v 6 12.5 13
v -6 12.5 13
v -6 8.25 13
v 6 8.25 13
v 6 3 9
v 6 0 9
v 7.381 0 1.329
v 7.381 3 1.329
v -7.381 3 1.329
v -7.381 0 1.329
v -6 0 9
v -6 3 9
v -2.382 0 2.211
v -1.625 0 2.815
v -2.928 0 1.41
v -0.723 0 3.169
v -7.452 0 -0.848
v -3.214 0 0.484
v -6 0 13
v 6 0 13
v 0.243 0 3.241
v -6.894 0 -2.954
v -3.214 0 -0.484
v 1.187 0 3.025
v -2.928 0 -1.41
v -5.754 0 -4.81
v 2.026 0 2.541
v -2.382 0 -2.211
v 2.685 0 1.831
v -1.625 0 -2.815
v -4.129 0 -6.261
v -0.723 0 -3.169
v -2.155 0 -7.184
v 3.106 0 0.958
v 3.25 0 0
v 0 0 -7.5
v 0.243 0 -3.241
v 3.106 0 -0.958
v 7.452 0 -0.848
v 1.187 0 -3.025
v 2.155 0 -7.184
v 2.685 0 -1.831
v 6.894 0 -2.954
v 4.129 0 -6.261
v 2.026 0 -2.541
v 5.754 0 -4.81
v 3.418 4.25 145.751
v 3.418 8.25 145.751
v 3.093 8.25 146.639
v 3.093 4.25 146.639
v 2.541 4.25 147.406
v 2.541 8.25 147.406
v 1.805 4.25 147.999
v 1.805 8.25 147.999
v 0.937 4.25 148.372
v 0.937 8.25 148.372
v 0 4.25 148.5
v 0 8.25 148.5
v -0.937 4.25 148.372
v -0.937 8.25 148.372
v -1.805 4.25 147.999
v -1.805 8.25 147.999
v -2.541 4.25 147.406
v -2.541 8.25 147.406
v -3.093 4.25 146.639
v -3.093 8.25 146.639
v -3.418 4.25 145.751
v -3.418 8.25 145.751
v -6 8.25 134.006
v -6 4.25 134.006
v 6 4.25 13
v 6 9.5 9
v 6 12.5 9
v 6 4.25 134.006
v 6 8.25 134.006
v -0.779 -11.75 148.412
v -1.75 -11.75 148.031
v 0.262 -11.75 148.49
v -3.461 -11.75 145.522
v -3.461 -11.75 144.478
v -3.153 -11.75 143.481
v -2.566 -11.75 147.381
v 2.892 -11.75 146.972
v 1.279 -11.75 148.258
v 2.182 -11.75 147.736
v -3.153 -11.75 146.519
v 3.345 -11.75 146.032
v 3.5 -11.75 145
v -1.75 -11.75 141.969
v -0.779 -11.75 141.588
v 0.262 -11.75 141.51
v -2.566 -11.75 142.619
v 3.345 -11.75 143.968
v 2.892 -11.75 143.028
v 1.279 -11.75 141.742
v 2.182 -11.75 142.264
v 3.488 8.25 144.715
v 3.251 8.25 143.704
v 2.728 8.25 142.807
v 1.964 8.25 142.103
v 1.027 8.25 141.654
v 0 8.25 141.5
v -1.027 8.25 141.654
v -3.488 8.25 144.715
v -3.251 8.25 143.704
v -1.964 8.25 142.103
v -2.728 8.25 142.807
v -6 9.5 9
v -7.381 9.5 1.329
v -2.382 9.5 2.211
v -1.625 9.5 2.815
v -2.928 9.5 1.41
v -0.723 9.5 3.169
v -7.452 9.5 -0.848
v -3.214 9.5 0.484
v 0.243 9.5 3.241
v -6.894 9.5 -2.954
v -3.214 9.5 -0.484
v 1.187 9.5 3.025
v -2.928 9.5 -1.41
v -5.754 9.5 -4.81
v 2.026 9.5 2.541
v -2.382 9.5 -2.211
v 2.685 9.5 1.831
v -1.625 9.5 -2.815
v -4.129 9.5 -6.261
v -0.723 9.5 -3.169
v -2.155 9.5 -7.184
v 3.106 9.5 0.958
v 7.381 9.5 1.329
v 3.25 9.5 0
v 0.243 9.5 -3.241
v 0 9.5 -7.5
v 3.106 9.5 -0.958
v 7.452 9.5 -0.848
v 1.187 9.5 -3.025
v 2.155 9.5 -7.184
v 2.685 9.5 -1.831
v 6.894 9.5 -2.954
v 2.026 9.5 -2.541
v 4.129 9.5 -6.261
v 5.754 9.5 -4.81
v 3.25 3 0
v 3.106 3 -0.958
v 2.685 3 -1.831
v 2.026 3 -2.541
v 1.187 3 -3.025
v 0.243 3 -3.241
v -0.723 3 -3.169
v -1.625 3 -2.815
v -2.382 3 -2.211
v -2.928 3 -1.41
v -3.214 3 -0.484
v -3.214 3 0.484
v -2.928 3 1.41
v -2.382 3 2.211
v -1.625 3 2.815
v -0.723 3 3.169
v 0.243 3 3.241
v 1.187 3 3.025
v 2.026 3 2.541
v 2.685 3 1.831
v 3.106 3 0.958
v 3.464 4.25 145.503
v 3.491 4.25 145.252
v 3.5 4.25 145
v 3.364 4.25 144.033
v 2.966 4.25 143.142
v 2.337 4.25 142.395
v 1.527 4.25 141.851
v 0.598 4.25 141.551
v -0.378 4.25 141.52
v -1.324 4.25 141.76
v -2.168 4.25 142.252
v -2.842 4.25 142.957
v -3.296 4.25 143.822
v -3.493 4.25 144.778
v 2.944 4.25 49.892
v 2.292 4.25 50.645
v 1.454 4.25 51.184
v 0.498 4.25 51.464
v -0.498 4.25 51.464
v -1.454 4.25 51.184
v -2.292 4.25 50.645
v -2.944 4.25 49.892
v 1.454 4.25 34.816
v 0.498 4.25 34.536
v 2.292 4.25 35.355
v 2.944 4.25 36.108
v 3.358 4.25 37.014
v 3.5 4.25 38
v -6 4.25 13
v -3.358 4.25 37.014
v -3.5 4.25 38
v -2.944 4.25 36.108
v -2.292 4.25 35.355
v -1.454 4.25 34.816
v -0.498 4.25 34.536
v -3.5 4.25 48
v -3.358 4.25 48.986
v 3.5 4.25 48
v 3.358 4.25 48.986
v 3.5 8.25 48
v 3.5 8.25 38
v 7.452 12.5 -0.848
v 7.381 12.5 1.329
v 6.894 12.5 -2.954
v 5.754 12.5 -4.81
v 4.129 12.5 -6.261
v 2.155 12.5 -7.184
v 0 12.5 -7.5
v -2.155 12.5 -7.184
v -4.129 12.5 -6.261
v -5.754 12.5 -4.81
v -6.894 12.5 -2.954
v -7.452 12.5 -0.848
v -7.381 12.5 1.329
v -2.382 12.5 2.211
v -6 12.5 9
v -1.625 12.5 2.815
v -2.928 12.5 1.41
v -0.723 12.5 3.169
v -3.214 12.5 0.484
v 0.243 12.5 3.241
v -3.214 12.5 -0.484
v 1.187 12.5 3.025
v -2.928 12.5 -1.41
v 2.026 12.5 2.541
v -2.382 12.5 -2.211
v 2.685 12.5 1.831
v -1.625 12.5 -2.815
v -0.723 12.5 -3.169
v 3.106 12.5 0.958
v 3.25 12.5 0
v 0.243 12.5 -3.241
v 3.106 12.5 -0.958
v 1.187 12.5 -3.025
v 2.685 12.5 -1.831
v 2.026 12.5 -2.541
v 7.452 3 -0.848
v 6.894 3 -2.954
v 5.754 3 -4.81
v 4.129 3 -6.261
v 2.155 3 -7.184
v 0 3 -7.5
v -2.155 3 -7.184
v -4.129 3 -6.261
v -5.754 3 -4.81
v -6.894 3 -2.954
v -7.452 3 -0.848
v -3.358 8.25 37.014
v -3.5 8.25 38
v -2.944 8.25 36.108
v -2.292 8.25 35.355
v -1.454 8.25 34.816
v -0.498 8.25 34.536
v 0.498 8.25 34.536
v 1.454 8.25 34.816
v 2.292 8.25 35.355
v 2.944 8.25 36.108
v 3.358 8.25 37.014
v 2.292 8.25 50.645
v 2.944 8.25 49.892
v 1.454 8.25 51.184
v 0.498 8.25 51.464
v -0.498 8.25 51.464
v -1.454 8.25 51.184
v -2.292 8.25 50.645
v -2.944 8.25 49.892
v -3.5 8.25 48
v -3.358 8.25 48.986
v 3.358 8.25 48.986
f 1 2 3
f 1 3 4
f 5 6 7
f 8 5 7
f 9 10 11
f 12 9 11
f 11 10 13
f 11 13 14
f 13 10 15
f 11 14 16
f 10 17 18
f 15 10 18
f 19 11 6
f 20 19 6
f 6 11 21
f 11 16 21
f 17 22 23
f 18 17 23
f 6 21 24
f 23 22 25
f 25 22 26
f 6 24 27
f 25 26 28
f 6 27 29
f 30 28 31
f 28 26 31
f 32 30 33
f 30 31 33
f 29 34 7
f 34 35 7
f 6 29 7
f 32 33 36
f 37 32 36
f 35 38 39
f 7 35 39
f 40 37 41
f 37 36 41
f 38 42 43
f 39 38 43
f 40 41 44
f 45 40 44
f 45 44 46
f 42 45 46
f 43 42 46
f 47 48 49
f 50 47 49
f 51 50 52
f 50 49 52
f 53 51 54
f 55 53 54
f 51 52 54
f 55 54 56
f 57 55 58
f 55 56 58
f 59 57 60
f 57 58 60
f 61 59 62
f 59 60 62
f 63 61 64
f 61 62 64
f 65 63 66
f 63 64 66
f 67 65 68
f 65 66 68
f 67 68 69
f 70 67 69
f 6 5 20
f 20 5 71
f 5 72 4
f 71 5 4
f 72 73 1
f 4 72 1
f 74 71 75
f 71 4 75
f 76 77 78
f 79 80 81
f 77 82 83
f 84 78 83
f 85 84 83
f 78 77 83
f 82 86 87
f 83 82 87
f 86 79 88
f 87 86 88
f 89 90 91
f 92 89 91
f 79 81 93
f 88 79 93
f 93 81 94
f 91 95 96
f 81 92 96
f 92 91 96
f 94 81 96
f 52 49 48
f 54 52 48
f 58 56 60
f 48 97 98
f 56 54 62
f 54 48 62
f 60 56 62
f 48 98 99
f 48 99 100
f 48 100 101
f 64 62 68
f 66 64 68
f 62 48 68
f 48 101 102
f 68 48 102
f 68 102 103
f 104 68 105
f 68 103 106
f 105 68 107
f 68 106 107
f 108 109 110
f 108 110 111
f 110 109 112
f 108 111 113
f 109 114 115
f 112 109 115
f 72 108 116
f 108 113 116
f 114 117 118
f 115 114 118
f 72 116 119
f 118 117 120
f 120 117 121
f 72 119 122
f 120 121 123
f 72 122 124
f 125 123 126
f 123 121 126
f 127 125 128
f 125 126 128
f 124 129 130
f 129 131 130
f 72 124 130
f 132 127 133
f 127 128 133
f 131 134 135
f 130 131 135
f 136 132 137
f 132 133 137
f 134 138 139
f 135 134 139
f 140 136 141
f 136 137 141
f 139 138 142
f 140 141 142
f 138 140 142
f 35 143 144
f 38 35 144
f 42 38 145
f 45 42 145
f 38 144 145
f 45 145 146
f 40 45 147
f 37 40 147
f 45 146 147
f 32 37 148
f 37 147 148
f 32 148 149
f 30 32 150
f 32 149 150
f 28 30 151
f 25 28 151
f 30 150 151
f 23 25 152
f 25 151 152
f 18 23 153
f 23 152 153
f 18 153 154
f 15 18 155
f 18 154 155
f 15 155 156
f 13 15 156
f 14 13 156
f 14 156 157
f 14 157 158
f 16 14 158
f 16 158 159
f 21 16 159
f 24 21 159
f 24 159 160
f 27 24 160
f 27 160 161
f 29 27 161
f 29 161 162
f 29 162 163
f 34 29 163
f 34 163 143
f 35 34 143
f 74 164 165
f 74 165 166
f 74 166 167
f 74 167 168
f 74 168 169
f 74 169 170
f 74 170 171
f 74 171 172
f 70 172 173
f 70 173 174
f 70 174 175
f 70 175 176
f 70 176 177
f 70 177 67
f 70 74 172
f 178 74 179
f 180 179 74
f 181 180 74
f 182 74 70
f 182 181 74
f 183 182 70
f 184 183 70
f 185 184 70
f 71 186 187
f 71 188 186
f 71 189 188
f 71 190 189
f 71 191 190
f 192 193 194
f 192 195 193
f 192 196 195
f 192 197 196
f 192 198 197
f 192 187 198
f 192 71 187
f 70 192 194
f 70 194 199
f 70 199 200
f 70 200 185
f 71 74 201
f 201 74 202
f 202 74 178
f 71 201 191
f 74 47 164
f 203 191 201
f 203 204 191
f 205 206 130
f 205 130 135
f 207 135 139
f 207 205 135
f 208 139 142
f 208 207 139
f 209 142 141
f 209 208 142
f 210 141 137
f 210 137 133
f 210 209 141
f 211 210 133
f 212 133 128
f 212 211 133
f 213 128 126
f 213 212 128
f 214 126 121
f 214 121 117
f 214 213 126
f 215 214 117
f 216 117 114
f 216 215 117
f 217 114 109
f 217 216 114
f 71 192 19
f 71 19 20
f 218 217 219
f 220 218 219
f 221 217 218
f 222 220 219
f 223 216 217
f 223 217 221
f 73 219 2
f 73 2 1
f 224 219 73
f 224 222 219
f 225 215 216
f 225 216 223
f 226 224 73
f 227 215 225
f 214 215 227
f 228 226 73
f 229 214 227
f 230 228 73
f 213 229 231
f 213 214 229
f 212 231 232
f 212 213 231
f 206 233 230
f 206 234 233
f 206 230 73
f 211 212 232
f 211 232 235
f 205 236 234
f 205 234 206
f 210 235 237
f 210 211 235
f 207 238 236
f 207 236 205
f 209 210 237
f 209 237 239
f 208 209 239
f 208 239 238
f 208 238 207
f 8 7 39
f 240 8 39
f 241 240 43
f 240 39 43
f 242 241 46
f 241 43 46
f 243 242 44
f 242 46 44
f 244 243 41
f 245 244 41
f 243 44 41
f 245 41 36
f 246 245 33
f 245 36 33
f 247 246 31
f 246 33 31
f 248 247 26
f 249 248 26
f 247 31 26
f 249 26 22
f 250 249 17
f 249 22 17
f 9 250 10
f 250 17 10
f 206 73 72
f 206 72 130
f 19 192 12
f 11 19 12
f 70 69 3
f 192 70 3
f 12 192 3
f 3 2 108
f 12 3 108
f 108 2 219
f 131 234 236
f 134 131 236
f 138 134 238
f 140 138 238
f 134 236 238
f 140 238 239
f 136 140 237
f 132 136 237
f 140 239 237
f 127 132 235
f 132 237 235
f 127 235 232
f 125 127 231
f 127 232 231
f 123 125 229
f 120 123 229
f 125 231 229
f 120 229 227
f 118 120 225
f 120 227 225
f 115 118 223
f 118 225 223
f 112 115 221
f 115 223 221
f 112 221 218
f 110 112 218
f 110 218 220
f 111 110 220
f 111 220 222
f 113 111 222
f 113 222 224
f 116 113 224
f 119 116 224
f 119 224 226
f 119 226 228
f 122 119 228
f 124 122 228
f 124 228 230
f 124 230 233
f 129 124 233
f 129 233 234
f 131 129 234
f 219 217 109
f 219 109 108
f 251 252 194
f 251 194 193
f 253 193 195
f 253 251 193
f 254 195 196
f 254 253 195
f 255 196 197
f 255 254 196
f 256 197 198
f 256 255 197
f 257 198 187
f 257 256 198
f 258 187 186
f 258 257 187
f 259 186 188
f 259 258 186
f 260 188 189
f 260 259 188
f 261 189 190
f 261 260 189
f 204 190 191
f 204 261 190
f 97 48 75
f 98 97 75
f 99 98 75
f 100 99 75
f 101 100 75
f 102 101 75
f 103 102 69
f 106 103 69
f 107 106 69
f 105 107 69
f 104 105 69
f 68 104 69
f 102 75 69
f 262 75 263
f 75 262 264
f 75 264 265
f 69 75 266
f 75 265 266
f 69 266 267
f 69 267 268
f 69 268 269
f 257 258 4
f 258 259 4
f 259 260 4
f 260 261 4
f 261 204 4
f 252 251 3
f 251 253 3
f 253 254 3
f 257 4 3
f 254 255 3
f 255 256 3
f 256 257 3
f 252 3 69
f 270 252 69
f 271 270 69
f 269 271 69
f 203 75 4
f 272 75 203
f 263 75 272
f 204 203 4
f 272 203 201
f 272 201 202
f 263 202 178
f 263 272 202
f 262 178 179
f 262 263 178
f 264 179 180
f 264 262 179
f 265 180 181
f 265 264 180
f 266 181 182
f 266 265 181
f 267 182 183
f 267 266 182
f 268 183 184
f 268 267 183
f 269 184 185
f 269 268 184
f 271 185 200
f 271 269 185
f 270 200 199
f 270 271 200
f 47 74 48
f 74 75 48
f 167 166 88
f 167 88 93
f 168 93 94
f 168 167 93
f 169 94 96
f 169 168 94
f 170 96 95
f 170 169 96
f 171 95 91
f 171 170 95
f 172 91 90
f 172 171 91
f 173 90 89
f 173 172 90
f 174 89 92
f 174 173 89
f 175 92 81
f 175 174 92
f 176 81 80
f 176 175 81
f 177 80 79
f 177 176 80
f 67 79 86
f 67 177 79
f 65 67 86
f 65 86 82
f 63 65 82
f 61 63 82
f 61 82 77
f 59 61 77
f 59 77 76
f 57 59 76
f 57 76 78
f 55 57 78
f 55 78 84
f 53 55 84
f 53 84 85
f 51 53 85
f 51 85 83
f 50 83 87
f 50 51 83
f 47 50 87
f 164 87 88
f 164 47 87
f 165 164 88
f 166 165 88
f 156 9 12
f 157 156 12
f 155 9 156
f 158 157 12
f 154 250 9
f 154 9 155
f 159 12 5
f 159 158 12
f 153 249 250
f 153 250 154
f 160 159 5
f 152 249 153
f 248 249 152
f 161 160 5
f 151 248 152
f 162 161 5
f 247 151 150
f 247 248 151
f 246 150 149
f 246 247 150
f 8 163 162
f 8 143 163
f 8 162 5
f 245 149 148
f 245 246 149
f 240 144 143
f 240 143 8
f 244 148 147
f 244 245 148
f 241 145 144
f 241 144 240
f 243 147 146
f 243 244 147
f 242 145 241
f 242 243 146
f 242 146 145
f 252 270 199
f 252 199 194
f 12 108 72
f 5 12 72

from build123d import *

# Parameters (mm, degrees)
EXTRUDE_1_DEPTH      = 3
SKETCH_2_W           = 12
SKETCH_2_H           = 12.5
EXTRUDE_2_DEPTH      = 4
EXTRUDE_3_DEPTH      = 3
SKETCH_4_R           = 3.25
CUT_EXTRUDE_1_DEPTH  = 13.5
EXTRUDE_4_DEPTH      = 2
EXTRUDE_4_DEPTH_BACK = 2
SKETCH_6_R           = 3.5
EXTRUDE_5_DEPTH      = 20


with BuildPart() as part:
    # Эскиз1 → Бобышка-Вытянуть1 (new body)
    with BuildSketch(Plane(origin=(0, 0, 0), x_dir=(1, 0, 0), z_dir=(0, 1, 0))):
        with BuildLine():
            Line((-7.38128575, -1.329142833), (-6, -9))
            Line((-6, -9), (6, -9))
            Line((6, -9), (7.38128575, -1.329142833))
            ThreePointArc((7.38128575, -1.329142833), (0, 7.5), (-7.38128575, -1.329142833))
        make_face()
    extrude(amount=EXTRUDE_1_DEPTH)

    # Эскиз2 → Бобышка-Вытянуть2 (add)
    with BuildSketch(Plane.XY.offset(9)):
        with Locations((0, 6.25)):
            Rectangle(SKETCH_2_W, SKETCH_2_H)
    extrude(amount=EXTRUDE_2_DEPTH)

    # Эскиз3 → Бобышка-Вытянуть3 (add)
    with BuildSketch(Plane(origin=(0, 12.5, 0), x_dir=(1, 0, 0), z_dir=(0, 1, 0))):
        with BuildLine():
            Line((-7.38128575, -1.329142833), (-6, -9))
            Line((-6, -9), (6, -9))
            Line((6, -9), (7.38128575, -1.329142833))
            ThreePointArc((7.38128575, -1.329142833), (0, 7.5), (-7.38128575, -1.329142833))
        make_face()
    extrude(amount=-EXTRUDE_3_DEPTH)

    # Эскиз4 → Вырез-Вытянуть1 (cut, through all)
    with BuildSketch(Plane(origin=(0, 12.5, 0), x_dir=(1, 0, 0), z_dir=(0, 1, 0))):
        Circle(SKETCH_4_R)
    extrude(amount=-CUT_EXTRUDE_1_DEPTH, mode=Mode.SUBTRACT)

    # Эскиз5 → Бобышка-Вытянуть4 (add, two sides)
    with BuildSketch(Plane(origin=(0, 6.25, 0), x_dir=(1, 0, 0), z_dir=(0, 1, 0))) as extrude_4_sk:
        with BuildLine():
            Line((-6, -13), (6, -13))
            Line((6, -13), (6, -134.006168685))
            Line((6, -134.006168685), (3.418398609, -145.751366054))
            ThreePointArc((3.418398609, -145.751366054), (0, -148.5), (-3.418398609, -145.751366054))
            Line((-3.418398609, -145.751366054), (-6, -134.006168685))
            Line((-6, -134.006168685), (-6, -13))
        make_face()
        with BuildLine():
            Line((3.5, -38), (3.5, -48))
            ThreePointArc((3.5, -48), (0, -51.5), (-3.5, -48))
            Line((-3.5, -48), (-3.5, -38))
            ThreePointArc((-3.5, -38), (0, -34.5), (3.5, -38))
        make_face(mode=Mode.SUBTRACT)
    extrude(amount=EXTRUDE_4_DEPTH)
    extrude(extrude_4_sk.sketch, amount=-EXTRUDE_4_DEPTH_BACK)

    # Эскиз6 → Бобышка-Вытянуть5 (add)
    with BuildSketch(Plane(origin=(0, 8.25, 0), x_dir=(1, 0, 0), z_dir=(0, 1, 0))):
        with Locations((0, -145)):
            Circle(SKETCH_6_R)
    extrude(amount=-EXTRUDE_5_DEPTH)


solid = part.part
